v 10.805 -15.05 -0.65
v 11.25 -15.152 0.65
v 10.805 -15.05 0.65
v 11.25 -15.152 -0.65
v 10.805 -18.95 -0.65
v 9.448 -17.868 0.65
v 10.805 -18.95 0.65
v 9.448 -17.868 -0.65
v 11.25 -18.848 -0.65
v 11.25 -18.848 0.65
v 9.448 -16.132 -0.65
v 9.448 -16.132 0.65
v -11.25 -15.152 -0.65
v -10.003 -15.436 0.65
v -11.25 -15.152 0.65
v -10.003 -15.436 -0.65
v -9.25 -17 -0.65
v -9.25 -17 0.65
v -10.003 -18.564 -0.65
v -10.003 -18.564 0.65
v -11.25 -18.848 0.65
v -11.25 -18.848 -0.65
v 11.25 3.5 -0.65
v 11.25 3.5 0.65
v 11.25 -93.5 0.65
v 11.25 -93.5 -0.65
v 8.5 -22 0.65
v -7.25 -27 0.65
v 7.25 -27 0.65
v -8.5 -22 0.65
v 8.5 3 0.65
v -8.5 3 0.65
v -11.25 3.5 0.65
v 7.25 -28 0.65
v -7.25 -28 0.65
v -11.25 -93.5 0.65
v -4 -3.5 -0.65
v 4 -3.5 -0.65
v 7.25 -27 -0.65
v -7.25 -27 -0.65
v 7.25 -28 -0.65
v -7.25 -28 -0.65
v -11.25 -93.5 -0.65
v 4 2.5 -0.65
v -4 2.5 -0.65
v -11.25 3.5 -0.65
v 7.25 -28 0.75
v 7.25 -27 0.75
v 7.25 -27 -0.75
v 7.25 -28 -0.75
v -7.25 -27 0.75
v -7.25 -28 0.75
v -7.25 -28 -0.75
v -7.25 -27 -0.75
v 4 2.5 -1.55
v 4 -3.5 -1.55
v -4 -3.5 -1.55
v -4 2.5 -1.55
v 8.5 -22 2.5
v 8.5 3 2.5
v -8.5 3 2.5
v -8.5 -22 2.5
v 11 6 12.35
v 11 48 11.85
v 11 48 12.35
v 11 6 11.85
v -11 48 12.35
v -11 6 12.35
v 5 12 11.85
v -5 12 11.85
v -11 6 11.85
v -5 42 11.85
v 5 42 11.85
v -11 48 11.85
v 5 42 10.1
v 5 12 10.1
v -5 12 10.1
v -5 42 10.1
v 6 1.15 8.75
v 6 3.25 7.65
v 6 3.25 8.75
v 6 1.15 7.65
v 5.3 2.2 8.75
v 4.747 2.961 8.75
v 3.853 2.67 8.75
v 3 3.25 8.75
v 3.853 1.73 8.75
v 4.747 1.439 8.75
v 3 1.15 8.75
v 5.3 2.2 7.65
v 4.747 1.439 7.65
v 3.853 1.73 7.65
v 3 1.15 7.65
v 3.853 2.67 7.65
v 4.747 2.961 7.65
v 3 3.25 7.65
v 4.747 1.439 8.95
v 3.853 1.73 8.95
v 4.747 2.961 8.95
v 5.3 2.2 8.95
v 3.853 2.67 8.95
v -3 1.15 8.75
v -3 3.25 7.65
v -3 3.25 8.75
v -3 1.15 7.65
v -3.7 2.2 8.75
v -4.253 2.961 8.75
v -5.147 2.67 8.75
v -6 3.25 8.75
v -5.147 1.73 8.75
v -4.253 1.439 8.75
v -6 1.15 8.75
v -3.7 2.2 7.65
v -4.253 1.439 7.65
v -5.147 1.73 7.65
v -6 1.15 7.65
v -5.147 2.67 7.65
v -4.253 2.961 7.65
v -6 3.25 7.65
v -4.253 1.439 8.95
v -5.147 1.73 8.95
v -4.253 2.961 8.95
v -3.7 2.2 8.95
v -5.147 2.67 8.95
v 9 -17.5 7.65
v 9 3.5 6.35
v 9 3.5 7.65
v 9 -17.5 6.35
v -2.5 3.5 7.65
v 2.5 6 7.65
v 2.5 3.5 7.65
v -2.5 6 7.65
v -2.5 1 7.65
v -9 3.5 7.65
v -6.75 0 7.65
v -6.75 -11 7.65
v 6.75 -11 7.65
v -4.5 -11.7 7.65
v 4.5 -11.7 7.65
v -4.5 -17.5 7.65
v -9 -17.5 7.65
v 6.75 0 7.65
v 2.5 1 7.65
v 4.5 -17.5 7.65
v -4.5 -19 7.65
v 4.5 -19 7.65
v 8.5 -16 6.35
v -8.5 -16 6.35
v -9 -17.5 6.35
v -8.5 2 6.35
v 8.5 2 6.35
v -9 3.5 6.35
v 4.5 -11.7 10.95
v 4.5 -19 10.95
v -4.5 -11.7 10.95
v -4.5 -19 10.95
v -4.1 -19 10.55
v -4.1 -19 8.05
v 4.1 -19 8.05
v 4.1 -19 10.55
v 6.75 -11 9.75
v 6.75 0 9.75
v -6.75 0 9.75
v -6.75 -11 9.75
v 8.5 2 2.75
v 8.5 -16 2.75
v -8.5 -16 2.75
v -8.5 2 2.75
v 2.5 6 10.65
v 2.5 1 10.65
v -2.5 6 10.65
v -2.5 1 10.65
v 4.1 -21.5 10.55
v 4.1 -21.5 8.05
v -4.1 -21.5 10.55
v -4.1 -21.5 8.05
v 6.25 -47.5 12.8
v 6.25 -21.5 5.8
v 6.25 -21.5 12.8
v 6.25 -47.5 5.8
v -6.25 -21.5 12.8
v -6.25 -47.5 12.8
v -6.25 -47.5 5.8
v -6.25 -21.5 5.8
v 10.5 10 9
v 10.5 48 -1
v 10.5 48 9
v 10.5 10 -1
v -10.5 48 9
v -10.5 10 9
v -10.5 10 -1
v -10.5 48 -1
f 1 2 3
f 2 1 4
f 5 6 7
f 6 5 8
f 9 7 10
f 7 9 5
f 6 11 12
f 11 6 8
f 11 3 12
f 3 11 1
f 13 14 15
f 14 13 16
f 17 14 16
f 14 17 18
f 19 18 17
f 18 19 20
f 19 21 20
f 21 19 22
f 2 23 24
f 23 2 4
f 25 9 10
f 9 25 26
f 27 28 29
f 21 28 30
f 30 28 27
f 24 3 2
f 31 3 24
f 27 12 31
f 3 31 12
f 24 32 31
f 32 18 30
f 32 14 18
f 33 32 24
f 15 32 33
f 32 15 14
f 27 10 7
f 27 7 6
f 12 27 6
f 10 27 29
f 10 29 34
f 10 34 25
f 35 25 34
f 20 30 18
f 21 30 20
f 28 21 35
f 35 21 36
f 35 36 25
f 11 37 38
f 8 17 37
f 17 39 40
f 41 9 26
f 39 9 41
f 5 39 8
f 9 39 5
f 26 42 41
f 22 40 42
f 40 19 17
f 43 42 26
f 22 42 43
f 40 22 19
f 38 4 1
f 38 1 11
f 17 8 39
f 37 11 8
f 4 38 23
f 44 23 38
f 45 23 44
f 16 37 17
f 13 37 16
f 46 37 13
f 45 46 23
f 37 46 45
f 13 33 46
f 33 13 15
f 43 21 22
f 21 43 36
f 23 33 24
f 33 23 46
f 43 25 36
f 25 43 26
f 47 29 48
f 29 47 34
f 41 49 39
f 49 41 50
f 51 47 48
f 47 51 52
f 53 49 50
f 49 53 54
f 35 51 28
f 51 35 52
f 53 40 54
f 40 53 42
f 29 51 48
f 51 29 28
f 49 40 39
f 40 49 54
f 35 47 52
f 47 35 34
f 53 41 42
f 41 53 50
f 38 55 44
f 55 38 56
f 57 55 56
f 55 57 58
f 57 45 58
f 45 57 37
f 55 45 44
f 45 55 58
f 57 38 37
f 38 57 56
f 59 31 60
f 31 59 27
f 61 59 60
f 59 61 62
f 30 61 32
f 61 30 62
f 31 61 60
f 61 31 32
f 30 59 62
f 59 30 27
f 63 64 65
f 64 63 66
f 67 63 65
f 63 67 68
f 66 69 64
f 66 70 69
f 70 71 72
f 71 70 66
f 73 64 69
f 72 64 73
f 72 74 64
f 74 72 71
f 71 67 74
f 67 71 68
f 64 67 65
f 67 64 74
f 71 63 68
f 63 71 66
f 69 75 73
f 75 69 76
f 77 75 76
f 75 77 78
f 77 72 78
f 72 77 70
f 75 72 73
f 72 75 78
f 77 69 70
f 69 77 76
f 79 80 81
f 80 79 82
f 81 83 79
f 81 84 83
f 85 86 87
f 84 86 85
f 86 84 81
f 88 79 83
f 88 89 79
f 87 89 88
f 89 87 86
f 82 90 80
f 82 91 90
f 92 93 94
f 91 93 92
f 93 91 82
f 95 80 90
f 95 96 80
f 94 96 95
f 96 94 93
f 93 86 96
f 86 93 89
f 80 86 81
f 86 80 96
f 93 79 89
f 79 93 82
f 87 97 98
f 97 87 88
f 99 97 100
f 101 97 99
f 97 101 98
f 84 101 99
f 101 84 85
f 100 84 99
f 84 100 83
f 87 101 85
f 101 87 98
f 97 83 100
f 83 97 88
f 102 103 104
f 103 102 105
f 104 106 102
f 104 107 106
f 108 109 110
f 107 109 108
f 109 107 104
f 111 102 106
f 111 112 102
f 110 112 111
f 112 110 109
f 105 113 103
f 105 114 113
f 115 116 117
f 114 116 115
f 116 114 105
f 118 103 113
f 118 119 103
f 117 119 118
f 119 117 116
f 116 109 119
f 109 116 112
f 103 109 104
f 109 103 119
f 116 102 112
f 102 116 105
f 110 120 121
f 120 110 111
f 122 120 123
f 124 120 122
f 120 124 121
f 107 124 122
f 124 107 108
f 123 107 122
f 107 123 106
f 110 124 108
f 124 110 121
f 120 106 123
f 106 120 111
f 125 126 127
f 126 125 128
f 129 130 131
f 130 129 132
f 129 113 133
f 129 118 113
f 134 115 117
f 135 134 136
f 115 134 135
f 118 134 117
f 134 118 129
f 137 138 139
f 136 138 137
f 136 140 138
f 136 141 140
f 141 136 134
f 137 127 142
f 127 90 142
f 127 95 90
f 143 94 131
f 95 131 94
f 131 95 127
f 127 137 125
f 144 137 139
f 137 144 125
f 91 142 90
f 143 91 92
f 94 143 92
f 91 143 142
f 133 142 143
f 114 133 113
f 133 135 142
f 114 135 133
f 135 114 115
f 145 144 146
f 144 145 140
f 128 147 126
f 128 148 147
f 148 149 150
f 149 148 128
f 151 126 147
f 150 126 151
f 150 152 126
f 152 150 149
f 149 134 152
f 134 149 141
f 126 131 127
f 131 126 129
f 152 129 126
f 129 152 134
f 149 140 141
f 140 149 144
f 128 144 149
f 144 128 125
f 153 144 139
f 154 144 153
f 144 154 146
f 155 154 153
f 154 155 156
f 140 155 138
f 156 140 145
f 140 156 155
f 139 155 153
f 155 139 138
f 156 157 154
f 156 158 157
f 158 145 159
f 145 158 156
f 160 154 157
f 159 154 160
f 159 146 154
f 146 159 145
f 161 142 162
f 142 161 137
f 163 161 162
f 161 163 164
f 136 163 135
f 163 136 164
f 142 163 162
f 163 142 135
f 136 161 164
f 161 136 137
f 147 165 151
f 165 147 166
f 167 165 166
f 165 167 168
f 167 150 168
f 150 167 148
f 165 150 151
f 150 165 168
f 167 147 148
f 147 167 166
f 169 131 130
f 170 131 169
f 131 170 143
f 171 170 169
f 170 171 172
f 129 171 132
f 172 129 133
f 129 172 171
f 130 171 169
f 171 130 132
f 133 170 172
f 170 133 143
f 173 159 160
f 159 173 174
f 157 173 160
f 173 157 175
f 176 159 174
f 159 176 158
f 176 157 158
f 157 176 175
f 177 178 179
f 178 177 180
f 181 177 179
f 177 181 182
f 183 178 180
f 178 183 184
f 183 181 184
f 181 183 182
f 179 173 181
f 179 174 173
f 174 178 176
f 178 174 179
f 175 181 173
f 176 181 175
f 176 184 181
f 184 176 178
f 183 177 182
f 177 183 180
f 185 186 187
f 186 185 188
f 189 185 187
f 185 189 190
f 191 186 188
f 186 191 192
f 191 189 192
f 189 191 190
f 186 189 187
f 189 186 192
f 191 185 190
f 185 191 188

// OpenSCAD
use <MCAD/boxes.scad>

//$fn=100;

// large battery 1200mAh : 63
// small battery  600mAh : 38
module battery(length, tol=0) {
    cube([21+tol,length+tol,10+tol],center=true);
}

function inc(arr,tol) = [arr[0]+tol,arr[1]+tol,arr[2]+tol];
function incA(arr,tol) = [arr[0]+tol[0],arr[1]+tol[1],arr[2]+tol[2]];

module esp32(tol=0) {
    pcb=[18,21,1.3];
    usb=[9,7.3,3.3];
    chip=[13.5,11,2.1];
    resistors=[17,18,3.6];

    union() {
      // PCB
      cube(inc(pcb, tol), center=true);    
      // USB
      translate([0,-pcb[1]/2+usb[1]/2-1.5,usb[2]/2+pcb[2]/2])
       cube(inc(usb, tol), center=true);    
      // chips
      translate([0,pcb[1]/2-9,chip[2]/2+pcb[2]/2])
       cube(chip, center=true);
      
      // button "boot"
      bt=[3,2.1,1.1];
      translate([4.5,pcb[1]/2-1.3,1.2]) {
       cube(bt, center=true);    
       cylinder(h=1.5,d=1.6, center=true);
      }
      // button "reset"
      translate([-4.5,pcb[1]/2-1.3,1.2]) {
       cube(bt, center=true);    
       cylinder(h=1.5,d=1.6, center=true);
      }
        
      // place for resistors (voltage and battery cables)
      translate([0,0,-resistors[2]/2-pcb[2]/2])
       cube(inc(resistors, tol), center=true);
      // BLE antenna connector
      translate([0,pcb[1]/2,pcb[2]/2+1.5])
       cube(inc([5,5,3], tol), center=true);
    }
}

module antenna(tol=[0,0,0]) {
    union(){        
     cube(incA([22,42,0.5], tol),center=true);
     translate([0,0,-1])        
      cube(incA([10,30,2], tol),center=true);
    }
}

module sensor(tol=0, do_hole=true) {
    pcb=[22.5,97,1.3];
    union() {
      difference() {
        cube(inc(pcb, tol), center=true);    
        if (do_hole) {
          translate([+pcb[0]/2,pcb[1]/2-20.5,0])
            cylinder(6,r=4/2,center=true);
          translate([-pcb[0]/2,pcb[1]/2-20.5,0])
            cylinder(6,r=4/2,center=true);
        }
      }
      // limit line
      translate([0,pcb[1]/2-31,0])
        cube([pcb[0]-8,1,pcb[2]+0.2],center=true);
      // soudures
      translate([0,pcb[1]/2-4,-pcb[2]/2+0.1])
        cube(inc([8,6,2], tol),center=true);
      // chip
      translate([0,pcb[1]/2-13,1.5])
        cube(inc([17,25,2],tol),center=true);
    }
}


module cable(tol=0) {
   translate([0,-4,0])
     cube(inc([8.2,8,2.5],tol),center=true);// usb
   translate([0,-18.9,0])
     cube(inc([12.5,30-4,7],tol),center=true); // plug
}

module model(batt_length, tol=0) {
  translate([0,-45,0])
    sensor(tol);      
  translate([0,27,12.1]) // -> moved 2mm down to adapt esp change below
    antenna([tol,tol,tol]);    
  translate([0,10+batt_length/2,4]) // -> moved 1mm down to keep place for antenna cable
    battery(batt_length,tol);
  translate([0,0,-1]) { // moved 3mm down from v8.0 since space was 9mm (mesured) between PCBs, and min could be 4mm (mesured) -> 9mm-4mm and keep 2mm for security.
    translate([0,-7,8])
      rotate([0,0,0])
        esp32(tol);
    translate([0,-15.6,10.3])
      cable(tol);
  }
}

module debug_esp32(tol=0) {
  translate([0,0,-1]) { // moved 3mm down from v8.0 since space was 9mm (mesured) between PCBs, and min could be 4mm (mesured) -> 9mm-4mm and keep 2mm for security.
    translate([0,-7,8])
      rotate([0,0,0])
        esp32(tol);
  }
}


batS=38;
batL=63;
model(batS);
//debug_esp32();
